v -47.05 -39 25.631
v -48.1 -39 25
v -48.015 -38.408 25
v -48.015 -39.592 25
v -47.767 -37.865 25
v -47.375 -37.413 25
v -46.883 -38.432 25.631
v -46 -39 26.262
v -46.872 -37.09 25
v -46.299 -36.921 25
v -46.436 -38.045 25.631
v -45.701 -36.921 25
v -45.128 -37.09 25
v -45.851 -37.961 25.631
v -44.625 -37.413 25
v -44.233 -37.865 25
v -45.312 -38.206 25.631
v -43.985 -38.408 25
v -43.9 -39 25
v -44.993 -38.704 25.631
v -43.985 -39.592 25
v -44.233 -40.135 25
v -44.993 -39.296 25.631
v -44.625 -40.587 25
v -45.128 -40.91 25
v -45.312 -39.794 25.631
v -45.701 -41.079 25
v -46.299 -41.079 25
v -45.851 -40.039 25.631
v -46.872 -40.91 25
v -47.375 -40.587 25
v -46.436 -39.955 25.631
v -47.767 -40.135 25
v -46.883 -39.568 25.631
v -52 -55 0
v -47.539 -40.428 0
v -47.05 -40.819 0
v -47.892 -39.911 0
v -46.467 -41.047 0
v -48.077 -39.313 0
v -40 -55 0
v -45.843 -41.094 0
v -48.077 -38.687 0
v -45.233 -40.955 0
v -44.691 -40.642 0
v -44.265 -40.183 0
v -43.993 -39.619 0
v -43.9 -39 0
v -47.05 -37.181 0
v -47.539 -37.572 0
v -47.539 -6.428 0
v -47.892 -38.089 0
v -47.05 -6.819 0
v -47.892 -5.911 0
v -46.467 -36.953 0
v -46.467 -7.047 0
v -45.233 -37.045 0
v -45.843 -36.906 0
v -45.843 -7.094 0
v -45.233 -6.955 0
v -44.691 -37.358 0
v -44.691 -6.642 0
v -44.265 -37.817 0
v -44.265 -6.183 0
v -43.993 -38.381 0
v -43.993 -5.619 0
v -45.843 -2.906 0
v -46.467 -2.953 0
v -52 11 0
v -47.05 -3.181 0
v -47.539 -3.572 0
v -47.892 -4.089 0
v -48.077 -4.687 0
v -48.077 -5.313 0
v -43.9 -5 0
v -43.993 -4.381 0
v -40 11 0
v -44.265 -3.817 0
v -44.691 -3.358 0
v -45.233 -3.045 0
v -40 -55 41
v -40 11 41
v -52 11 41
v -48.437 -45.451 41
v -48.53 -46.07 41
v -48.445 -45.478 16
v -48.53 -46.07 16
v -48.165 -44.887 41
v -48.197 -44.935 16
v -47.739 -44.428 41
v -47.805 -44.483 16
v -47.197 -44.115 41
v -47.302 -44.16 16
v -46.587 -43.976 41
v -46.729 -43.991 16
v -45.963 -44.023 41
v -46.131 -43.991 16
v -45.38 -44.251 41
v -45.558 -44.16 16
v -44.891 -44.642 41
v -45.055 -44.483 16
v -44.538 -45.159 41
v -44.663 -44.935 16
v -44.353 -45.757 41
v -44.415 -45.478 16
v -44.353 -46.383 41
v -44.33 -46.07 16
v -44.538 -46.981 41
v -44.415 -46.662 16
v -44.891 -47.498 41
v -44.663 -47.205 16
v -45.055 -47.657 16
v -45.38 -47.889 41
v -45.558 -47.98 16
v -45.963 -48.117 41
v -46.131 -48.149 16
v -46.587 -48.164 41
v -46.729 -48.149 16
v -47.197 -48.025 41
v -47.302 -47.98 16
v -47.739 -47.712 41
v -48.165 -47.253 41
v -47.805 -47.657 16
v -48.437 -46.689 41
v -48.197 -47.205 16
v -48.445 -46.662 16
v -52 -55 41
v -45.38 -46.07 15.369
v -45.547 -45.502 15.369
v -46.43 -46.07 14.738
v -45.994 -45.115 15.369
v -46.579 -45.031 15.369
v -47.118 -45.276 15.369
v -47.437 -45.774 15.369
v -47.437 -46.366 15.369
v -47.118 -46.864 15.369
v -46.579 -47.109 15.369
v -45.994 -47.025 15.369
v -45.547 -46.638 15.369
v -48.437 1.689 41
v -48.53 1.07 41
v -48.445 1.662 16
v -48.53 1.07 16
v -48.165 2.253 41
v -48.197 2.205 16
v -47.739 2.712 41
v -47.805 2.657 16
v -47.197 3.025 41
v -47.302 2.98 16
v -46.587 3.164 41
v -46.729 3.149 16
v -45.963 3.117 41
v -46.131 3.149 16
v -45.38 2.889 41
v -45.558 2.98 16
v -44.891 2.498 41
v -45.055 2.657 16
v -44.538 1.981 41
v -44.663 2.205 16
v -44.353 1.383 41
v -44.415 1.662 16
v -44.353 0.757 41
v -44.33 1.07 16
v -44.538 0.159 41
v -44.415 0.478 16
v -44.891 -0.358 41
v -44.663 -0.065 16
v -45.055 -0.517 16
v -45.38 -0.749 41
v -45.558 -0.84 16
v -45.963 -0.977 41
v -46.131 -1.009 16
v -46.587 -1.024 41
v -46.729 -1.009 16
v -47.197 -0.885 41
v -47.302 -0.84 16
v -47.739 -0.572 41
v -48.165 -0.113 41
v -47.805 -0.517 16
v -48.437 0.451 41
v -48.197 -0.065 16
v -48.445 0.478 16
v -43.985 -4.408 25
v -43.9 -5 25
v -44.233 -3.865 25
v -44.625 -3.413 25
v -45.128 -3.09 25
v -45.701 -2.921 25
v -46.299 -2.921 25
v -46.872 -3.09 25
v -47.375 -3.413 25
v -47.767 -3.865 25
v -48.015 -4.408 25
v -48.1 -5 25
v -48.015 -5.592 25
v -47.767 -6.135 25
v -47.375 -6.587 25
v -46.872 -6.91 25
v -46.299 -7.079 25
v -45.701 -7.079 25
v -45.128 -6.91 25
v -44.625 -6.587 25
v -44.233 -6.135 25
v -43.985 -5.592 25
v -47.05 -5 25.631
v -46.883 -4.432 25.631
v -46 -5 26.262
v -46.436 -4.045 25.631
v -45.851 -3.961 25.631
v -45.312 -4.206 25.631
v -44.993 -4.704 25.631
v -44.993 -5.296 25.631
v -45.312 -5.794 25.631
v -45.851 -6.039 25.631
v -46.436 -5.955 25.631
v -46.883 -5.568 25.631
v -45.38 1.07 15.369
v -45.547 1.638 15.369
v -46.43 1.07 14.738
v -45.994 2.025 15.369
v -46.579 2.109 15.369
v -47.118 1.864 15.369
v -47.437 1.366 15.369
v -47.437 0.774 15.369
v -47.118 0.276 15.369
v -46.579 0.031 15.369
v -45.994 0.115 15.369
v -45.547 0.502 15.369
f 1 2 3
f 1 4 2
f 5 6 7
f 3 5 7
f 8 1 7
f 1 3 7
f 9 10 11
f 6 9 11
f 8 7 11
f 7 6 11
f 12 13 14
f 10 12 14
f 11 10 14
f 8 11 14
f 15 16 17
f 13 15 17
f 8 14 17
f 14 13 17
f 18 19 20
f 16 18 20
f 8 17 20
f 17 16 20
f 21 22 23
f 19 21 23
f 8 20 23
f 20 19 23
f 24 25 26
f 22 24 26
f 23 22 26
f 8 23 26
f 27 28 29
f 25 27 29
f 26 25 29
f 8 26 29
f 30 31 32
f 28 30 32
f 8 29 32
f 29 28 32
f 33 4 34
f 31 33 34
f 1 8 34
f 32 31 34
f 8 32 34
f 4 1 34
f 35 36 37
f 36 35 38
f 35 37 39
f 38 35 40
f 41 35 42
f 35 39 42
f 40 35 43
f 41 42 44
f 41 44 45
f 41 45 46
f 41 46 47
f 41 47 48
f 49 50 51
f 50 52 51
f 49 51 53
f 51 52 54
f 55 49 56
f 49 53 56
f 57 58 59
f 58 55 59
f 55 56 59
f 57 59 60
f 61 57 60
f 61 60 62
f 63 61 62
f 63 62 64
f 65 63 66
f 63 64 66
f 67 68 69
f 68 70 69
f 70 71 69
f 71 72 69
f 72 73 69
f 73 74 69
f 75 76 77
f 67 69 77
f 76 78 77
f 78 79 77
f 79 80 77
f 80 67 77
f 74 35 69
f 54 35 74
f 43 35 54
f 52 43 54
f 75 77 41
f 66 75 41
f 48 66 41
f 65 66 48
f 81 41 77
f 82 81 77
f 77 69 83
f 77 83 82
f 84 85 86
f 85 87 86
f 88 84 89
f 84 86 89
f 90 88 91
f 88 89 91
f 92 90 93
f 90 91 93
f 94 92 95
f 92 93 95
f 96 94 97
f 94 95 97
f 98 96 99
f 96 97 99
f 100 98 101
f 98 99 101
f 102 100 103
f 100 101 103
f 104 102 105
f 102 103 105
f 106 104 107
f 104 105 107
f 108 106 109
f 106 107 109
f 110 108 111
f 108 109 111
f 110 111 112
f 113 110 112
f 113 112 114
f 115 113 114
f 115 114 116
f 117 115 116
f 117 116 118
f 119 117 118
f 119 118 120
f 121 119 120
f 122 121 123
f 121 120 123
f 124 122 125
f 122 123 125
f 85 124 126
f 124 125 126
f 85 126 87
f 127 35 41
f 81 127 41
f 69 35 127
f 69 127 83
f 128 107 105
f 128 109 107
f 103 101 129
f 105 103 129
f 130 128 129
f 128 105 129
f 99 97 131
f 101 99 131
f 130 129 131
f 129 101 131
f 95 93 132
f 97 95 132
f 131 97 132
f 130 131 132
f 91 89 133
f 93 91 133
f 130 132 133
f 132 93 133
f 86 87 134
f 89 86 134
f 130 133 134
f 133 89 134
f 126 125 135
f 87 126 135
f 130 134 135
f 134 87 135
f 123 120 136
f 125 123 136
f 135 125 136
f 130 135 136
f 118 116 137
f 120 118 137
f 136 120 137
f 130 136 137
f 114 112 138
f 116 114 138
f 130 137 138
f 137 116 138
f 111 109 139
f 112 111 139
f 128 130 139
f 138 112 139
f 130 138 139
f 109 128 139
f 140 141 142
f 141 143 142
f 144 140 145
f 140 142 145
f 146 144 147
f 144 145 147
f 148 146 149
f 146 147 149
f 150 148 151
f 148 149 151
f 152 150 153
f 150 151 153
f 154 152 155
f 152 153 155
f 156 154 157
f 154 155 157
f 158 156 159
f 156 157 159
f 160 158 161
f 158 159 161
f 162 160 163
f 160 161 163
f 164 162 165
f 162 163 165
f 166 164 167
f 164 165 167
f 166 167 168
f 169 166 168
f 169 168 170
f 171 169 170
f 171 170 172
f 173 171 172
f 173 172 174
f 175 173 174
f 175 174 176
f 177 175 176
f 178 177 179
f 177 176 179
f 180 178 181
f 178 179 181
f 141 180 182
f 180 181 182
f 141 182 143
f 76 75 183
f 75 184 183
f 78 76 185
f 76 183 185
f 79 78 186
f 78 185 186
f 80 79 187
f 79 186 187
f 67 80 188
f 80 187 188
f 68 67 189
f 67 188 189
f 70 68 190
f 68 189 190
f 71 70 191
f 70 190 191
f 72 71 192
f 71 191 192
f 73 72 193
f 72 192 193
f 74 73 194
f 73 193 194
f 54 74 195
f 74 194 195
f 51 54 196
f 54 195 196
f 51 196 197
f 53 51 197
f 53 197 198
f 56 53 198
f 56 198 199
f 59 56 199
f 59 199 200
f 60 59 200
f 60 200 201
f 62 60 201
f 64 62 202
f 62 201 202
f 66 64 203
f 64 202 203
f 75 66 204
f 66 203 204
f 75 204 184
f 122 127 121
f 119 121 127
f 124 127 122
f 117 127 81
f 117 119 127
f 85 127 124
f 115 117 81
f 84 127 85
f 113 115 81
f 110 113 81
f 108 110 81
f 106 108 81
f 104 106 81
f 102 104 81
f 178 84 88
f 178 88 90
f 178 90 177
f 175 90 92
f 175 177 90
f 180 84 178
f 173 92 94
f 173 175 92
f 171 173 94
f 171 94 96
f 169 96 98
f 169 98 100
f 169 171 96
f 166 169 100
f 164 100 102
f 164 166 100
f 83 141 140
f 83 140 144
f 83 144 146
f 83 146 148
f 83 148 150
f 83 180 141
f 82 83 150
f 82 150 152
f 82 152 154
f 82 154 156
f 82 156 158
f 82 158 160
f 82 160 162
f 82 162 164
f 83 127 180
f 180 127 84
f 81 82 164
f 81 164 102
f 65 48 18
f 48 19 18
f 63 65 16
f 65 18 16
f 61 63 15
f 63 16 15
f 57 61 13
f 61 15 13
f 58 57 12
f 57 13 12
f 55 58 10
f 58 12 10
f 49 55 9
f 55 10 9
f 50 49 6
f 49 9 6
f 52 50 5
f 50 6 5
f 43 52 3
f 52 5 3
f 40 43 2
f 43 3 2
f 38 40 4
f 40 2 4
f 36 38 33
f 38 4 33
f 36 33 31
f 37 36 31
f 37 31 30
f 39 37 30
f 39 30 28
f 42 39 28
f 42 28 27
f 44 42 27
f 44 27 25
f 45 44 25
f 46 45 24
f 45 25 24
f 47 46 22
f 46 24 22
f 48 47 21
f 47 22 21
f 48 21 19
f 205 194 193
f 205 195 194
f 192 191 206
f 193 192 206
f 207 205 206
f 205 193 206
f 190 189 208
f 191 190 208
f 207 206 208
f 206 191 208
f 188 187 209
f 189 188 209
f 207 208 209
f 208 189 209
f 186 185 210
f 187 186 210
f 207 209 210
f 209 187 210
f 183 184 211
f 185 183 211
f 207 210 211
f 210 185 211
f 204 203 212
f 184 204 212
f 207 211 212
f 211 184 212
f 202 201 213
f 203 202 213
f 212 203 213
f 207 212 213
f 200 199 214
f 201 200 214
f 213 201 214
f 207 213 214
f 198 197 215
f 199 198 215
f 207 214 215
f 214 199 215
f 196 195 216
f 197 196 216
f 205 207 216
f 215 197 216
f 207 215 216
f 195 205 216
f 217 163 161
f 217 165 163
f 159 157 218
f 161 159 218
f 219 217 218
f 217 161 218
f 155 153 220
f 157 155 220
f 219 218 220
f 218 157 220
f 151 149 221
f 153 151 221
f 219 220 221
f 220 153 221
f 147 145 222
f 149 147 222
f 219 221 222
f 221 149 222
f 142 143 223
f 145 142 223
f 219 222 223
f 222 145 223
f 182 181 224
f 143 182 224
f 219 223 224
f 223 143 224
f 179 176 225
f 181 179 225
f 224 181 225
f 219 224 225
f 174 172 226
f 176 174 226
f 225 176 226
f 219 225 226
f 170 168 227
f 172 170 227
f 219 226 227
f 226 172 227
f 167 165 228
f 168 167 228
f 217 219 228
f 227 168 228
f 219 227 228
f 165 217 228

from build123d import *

# Parameters (mm, degrees)
SZKIC1_W                       = 12
SZKIC1_H                       = 66
DODANIE_WYCI_GNI_CIE1_DEPTH    = 41
OTW_R_GWINTOWANY_M5X0_81_D     = 4.2
OTW_R_GWINTOWANY_M5X0_81_DEPTH = 25
OTW_R_GWINTOWANY_M5X0_81_TIP   = 1.2618073
OTW_R_GWINTOWANY_M5X0_82_D     = 4.2
OTW_R_GWINTOWANY_M5X0_82_DEPTH = 25
OTW_R_GWINTOWANY_M5X0_82_TIP   = 1.2618073


with BuildPart() as part:
    # Szkic1 → Dodanie-wyciągnięcie1 (new body)
    with BuildSketch(Plane.XY):
        with Locations((-46, -22)):
            Rectangle(SZKIC1_W, SZKIC1_H)
    extrude(amount=DODANIE_WYCI_GNI_CIE1_DEPTH)

    # Otwór gwintowany M5x0.81
    with Locations(Plane(origin=(0, 0, 0), x_dir=(-1, 0, 0), z_dir=(0, 0, -1))):
        with Locations((46, -39), (46, -5)):
            Hole(OTW_R_GWINTOWANY_M5X0_81_D / 2, depth=OTW_R_GWINTOWANY_M5X0_81_DEPTH)
            with Locations((0, 0, -(OTW_R_GWINTOWANY_M5X0_81_DEPTH + OTW_R_GWINTOWANY_M5X0_81_TIP / 2))):  # 118° drill point
                Cone(0, OTW_R_GWINTOWANY_M5X0_81_D / 2, OTW_R_GWINTOWANY_M5X0_81_TIP, mode=Mode.SUBTRACT)

    # Otwór gwintowany M5x0.82
    with Locations(Plane.XY.offset(41)):
        with Locations((-46.43, -46.07), (-46.43, 1.07)):
            Hole(OTW_R_GWINTOWANY_M5X0_82_D / 2, depth=OTW_R_GWINTOWANY_M5X0_82_DEPTH)
            with Locations((0, 0, -(OTW_R_GWINTOWANY_M5X0_82_DEPTH + OTW_R_GWINTOWANY_M5X0_82_TIP / 2))):  # 118° drill point
                Cone(0, OTW_R_GWINTOWANY_M5X0_82_D / 2, OTW_R_GWINTOWANY_M5X0_82_TIP, mode=Mode.SUBTRACT)


solid = part.part
